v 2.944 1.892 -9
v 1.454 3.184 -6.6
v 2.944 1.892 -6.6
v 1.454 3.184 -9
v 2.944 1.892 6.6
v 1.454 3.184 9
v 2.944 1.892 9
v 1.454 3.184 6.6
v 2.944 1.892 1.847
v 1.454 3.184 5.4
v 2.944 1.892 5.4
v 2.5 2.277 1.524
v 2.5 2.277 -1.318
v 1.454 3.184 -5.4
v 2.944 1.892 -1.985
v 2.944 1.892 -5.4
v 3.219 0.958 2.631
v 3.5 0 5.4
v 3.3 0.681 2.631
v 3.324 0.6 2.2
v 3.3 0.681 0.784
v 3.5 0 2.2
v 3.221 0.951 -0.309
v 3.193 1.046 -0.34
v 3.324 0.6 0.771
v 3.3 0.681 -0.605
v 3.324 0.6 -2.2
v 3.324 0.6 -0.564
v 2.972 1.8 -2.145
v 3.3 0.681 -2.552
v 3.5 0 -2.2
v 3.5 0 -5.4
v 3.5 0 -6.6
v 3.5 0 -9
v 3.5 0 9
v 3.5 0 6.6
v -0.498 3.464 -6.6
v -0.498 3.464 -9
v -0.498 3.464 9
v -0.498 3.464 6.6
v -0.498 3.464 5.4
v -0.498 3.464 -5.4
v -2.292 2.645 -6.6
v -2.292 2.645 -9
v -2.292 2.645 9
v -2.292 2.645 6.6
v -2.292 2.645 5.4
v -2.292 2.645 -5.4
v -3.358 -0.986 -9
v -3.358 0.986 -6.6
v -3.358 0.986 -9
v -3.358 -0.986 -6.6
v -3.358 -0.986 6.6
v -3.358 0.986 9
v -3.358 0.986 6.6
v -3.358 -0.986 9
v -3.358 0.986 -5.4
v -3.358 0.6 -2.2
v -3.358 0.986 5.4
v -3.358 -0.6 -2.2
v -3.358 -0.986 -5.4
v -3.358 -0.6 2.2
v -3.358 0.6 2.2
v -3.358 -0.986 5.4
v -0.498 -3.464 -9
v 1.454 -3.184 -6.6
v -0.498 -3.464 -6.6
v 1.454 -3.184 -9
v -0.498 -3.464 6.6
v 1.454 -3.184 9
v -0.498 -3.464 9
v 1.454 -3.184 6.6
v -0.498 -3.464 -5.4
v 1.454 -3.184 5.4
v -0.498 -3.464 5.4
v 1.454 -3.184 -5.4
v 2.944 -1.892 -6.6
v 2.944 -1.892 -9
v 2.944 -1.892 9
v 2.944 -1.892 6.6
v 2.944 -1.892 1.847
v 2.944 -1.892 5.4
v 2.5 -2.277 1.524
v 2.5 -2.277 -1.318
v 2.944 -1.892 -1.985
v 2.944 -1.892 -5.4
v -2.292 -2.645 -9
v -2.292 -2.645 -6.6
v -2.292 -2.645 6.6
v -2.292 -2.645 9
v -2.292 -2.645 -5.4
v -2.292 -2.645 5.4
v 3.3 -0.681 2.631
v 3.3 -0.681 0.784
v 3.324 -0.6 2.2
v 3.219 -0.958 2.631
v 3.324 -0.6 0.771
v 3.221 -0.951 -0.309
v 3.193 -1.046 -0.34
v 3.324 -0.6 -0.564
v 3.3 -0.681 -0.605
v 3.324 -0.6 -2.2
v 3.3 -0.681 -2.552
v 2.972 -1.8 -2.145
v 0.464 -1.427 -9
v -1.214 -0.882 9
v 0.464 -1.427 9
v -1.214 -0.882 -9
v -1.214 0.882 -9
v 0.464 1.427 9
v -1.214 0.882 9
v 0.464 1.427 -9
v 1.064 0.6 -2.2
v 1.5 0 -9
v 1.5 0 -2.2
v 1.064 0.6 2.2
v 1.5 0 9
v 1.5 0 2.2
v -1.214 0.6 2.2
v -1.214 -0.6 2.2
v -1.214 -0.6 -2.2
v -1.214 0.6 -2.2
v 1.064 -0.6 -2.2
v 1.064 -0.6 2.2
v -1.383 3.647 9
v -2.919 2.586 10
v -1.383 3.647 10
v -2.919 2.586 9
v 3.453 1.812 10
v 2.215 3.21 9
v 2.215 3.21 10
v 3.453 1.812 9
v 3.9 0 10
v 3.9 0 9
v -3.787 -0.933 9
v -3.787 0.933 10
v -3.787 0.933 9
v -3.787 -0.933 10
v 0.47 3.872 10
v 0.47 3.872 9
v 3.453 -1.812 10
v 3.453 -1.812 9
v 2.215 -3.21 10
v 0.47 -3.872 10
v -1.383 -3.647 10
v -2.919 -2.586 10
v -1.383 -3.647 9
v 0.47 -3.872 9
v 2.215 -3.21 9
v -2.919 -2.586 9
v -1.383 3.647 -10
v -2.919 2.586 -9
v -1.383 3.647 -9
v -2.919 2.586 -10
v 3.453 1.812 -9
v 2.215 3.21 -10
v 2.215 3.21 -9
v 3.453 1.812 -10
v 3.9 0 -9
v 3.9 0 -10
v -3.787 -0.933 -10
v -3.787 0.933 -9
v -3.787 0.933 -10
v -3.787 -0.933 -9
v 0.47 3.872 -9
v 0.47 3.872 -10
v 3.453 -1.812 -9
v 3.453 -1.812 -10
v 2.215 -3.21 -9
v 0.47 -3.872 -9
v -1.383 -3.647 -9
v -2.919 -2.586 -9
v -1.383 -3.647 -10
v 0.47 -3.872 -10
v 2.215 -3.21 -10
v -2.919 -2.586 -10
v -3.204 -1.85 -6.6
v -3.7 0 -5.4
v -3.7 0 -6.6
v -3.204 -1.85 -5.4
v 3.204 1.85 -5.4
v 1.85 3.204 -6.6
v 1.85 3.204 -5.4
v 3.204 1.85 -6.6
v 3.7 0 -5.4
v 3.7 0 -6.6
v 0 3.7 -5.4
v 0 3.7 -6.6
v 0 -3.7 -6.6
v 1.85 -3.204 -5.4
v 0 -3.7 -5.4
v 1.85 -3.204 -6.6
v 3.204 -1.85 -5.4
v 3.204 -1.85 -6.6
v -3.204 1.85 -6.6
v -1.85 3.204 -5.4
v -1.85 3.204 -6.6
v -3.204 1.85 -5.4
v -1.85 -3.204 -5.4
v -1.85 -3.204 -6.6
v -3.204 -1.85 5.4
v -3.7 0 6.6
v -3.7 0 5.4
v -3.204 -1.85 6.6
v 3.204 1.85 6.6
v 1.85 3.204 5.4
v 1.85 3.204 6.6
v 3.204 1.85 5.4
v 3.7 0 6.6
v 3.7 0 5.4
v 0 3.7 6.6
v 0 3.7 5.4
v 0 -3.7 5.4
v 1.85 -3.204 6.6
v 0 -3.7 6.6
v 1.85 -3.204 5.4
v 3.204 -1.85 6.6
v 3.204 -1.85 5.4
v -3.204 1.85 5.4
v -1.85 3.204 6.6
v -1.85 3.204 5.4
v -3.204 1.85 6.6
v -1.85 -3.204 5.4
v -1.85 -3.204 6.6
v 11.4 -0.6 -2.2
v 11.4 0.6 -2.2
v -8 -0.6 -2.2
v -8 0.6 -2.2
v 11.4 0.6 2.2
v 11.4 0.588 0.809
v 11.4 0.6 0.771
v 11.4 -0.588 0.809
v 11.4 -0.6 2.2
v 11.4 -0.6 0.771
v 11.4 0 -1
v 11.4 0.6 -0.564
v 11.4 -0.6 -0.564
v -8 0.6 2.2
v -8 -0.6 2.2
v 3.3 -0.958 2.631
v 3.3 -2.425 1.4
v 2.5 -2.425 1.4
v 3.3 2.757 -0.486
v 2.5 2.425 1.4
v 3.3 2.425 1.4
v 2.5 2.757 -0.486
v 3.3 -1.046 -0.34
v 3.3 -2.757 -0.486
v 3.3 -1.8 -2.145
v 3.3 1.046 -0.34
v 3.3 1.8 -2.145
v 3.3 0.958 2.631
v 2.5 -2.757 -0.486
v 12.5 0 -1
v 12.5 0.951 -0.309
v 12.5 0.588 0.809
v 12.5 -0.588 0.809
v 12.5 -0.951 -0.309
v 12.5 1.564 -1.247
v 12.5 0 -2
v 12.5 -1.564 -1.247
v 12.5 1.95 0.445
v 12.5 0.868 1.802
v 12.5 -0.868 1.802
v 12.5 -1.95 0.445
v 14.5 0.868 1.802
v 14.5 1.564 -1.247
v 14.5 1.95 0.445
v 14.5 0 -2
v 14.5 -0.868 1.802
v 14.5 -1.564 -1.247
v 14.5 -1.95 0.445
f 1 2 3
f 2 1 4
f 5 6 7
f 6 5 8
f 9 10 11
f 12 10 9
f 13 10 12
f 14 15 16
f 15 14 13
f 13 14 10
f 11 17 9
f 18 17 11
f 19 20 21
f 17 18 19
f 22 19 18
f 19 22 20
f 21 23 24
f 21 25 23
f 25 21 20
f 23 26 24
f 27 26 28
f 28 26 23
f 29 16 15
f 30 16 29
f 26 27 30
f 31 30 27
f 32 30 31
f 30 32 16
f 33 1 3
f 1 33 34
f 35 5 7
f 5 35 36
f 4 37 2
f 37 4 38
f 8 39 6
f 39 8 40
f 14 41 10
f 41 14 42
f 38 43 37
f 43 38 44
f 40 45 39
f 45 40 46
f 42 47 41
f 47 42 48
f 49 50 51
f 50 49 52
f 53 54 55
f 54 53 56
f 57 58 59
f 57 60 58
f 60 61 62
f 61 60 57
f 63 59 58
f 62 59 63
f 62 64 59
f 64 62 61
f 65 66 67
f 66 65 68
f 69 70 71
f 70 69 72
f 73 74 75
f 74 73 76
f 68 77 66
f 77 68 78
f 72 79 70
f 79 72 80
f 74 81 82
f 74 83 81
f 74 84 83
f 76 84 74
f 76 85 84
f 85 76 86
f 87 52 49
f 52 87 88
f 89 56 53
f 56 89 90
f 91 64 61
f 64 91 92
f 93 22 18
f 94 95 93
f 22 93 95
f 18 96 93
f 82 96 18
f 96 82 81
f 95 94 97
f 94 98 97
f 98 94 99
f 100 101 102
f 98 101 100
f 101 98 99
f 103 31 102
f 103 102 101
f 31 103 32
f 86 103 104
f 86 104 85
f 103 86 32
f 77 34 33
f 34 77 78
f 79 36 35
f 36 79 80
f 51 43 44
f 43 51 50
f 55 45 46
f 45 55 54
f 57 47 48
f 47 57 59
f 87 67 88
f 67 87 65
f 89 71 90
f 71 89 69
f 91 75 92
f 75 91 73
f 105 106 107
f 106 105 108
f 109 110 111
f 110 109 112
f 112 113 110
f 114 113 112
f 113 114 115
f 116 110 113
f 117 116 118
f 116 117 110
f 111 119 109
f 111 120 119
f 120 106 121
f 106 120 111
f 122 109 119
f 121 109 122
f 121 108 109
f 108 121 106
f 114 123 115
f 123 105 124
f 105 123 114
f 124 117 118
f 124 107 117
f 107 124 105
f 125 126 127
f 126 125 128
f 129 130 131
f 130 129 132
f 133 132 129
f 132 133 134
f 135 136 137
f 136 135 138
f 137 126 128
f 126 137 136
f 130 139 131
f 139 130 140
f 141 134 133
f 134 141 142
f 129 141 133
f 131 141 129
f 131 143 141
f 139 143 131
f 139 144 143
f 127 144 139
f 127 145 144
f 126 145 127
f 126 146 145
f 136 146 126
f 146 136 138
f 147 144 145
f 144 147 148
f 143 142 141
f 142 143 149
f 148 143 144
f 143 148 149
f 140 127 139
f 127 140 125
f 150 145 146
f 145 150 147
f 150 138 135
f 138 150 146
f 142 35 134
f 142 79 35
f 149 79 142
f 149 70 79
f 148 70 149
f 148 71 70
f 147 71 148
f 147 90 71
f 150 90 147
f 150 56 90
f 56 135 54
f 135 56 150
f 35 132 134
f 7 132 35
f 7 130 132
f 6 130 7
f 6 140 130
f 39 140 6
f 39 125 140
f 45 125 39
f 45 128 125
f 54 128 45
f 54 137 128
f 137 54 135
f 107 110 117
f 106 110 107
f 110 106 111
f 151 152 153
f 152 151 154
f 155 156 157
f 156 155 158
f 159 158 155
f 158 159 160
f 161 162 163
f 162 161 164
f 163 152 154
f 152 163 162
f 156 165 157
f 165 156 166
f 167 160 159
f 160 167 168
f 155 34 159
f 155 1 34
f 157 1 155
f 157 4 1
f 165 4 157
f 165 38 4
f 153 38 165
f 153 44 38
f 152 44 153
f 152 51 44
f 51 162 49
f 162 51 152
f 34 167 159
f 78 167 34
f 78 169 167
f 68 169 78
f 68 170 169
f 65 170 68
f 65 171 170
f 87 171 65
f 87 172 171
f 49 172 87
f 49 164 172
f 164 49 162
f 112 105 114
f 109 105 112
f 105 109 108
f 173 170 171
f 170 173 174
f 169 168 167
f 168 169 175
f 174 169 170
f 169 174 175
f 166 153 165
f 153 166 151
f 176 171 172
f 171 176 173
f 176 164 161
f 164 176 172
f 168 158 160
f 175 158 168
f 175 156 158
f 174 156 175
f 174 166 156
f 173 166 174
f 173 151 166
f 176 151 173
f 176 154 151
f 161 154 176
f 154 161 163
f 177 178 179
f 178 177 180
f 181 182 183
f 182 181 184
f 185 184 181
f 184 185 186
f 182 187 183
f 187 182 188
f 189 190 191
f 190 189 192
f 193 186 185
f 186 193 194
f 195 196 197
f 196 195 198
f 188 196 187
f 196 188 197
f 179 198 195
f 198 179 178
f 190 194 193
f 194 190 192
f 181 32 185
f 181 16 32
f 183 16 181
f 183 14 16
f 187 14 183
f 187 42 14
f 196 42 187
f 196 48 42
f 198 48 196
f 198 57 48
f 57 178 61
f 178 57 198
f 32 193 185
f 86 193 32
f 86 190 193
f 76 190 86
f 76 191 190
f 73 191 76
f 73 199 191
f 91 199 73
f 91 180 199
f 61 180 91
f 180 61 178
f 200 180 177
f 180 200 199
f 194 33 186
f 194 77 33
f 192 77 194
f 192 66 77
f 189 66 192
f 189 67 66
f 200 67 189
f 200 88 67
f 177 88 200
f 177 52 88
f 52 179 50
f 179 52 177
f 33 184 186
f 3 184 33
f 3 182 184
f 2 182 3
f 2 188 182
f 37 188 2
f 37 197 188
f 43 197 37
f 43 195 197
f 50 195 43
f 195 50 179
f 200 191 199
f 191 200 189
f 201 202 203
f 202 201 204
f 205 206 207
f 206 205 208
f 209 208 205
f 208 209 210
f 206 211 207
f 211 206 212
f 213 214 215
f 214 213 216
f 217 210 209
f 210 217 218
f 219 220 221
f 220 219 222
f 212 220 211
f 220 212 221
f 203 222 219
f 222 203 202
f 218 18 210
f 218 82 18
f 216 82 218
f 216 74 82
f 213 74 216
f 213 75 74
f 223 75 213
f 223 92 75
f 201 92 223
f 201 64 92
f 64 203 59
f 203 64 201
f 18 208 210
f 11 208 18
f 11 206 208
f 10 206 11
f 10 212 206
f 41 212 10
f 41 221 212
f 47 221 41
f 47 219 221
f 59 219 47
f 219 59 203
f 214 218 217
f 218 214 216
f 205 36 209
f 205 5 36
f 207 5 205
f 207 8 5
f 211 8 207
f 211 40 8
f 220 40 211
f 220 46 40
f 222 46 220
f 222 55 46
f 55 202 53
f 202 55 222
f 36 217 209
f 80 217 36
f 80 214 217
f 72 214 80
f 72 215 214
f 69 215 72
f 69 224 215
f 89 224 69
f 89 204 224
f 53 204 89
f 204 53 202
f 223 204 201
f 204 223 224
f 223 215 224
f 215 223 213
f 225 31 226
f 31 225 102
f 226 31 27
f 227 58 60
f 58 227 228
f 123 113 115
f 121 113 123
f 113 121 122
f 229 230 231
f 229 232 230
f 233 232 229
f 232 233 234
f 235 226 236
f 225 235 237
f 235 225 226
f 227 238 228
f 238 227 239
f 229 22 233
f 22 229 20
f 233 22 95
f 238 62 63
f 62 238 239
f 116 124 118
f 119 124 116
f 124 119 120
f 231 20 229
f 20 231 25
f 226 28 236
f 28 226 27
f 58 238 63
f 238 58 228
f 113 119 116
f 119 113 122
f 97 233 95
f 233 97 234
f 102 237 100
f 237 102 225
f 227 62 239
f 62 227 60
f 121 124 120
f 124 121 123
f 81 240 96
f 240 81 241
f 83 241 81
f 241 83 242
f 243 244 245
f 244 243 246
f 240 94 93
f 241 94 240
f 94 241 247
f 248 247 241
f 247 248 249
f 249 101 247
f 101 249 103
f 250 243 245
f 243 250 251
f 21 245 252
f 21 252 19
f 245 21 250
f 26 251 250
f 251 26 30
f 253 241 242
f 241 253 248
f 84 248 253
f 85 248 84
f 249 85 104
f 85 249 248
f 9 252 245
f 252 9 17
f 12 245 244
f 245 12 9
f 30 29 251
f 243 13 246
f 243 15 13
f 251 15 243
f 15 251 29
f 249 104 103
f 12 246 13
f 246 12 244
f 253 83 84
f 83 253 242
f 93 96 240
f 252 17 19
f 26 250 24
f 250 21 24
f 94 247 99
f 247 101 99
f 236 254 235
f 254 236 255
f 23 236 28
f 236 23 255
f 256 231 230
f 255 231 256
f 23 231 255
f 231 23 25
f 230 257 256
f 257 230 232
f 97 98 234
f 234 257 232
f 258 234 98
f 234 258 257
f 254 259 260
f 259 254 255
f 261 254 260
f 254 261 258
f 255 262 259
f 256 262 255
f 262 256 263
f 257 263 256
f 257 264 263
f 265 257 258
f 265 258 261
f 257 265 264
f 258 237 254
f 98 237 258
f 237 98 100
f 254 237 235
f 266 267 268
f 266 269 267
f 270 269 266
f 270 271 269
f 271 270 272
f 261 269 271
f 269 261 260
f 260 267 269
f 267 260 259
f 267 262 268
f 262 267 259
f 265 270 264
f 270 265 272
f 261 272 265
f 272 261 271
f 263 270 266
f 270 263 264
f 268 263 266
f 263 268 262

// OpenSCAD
// Parameters
bore_diameter_mm = 3.0; //[1.5:6.0:0.1]
outer_diameter_mm = 7.0; //[3.5:14.0:0.1]
length_mm = 19.0; //[9.5:38.0:0.5]
bore_radius_mm = 1.5; //[0.75:3.0:0.05]
outer_radius_mm = 3.5; //[1.75:7.0:0.05]
wall_thickness_mm = 2.0; //[1.0:4.0:0.1]
eps_mm = 0.2; //[0.05:0.5:0.05]
overlap_mm = 1.0; //[0.5:2.0:0.1]
seal_lip_thickness_mm = 1.0; //[0.5:2.0:0.1]
seal_lip_radial_mm = 0.4; //[0.2:1.0:0.05]
slot_enabled = 1; //[0:1:1]
slot_width_mm = 1.2; //[0.2:3.0:0.1]
slot_depth_mm = 4.0; //[1.0:8.0:0.1]
groove_enabled = 1; //[0:1:1]
groove_count = 2; //[0:4:1]
groove_width_mm = 1.2; //[0.6:3.0:0.1]
groove_depth_mm = 0.4; //[0.2:1.0:0.05]
groove_spacing_mm = 12.0; //[6.0:24.0:0.5]
screw_shank_radius_mm = 1.0; //[0.6:2.0:0.05]
screw_length_mm = 10.0; //[5.0:20.0:0.5]
screw_head_radius_mm = 2.0; //[1.2:4.0:0.1]
screw_head_height_mm = 2.0; //[1.0:4.0:0.1]
washer_outer_radius_mm = 2.8; //[1.8:5.6:0.1]
washer_thickness_mm = 0.8; //[0.4:2.0:0.1]
washer_hole_radius_mm = 1.1; //[0.7:2.2:0.05]

// Linear Bearing - complete geometry
module linear_bearing() {
  color([0.85, 0.85, 0.8]) {
    // Outer casing
    difference() {
      cylinder(r=outer_radius_mm, h=length_mm, center=true);
      cylinder(r=bore_radius_mm, h=length_mm + 2*eps_mm, center=true);
    }
    // End seal lips
    union() {
      translate([0, 0, length_mm/2 - seal_lip_thickness_mm/2 + overlap_mm/2])
        cylinder(r=outer_radius_mm + seal_lip_radial_mm, h=seal_lip_thickness_mm, center=true);
      translate([0, 0, -length_mm/2 + seal_lip_thickness_mm/2 - overlap_mm/2])
        cylinder(r=outer_radius_mm + seal_lip_radial_mm, h=seal_lip_thickness_mm, center=true);
    }
    // Optional grooves
    if (groove_enabled) {
      for (i = [-1, 1]) {
        difference() {
          translate([0, 0, i * groove_spacing_mm/2])
            cylinder(r=outer_radius_mm + eps_mm, h=groove_width_mm, center=true);
          translate([0, 0, i * groove_spacing_mm/2])
            cylinder(r=outer_radius_mm - groove_depth_mm, h=groove_width_mm + 2*eps_mm, center=true);
        }
      }
    }
    // Optional slot
    if (slot_enabled) {
      translate([outer_radius_mm - slot_depth_mm/2 + eps_mm, 0, 0])
        rotate([0, 90, 0])
        cube([slot_depth_mm + 2*eps_mm, slot_width_mm, length_mm + 2*eps_mm], center=true);
    }
  }
}

// Screw and Washer - complete geometry
module screw_and_washer() {
  color("Silver") {
    // Screw shank
    translate([outer_radius_mm + screw_length_mm/2 - overlap_mm, 0, 0])
      rotate([0, 90, 0])
      cylinder(r=screw_shank_radius_mm, h=screw_length_mm, center=true);
    // Screw head
    translate([outer_radius_mm + screw_length_mm + screw_head_height_mm/2 - overlap_mm, 0, 0])
      rotate([0, 90, 0])
      cylinder(r=screw_head_radius_mm, h=screw_head_height_mm, center=true);
    // Washer
    difference() {
      translate([outer_radius_mm + washer_thickness_mm/2 - overlap_mm, 0, 0])
        rotate([0, 90, 0])
        cylinder(r=washer_outer_radius_mm, h=washer_thickness_mm, center=true);
      translate([outer_radius_mm + washer_thickness_mm/2 - overlap_mm, 0, 0])
        rotate([0, 90, 0])
        cylinder(r=washer_hole_radius_mm, h=washer_thickness_mm + 2*eps_mm, center=true);
    }
  }
}

// Assembly
module assembly() {
  linear_bearing();
  screw_and_washer();
}

assembly();
